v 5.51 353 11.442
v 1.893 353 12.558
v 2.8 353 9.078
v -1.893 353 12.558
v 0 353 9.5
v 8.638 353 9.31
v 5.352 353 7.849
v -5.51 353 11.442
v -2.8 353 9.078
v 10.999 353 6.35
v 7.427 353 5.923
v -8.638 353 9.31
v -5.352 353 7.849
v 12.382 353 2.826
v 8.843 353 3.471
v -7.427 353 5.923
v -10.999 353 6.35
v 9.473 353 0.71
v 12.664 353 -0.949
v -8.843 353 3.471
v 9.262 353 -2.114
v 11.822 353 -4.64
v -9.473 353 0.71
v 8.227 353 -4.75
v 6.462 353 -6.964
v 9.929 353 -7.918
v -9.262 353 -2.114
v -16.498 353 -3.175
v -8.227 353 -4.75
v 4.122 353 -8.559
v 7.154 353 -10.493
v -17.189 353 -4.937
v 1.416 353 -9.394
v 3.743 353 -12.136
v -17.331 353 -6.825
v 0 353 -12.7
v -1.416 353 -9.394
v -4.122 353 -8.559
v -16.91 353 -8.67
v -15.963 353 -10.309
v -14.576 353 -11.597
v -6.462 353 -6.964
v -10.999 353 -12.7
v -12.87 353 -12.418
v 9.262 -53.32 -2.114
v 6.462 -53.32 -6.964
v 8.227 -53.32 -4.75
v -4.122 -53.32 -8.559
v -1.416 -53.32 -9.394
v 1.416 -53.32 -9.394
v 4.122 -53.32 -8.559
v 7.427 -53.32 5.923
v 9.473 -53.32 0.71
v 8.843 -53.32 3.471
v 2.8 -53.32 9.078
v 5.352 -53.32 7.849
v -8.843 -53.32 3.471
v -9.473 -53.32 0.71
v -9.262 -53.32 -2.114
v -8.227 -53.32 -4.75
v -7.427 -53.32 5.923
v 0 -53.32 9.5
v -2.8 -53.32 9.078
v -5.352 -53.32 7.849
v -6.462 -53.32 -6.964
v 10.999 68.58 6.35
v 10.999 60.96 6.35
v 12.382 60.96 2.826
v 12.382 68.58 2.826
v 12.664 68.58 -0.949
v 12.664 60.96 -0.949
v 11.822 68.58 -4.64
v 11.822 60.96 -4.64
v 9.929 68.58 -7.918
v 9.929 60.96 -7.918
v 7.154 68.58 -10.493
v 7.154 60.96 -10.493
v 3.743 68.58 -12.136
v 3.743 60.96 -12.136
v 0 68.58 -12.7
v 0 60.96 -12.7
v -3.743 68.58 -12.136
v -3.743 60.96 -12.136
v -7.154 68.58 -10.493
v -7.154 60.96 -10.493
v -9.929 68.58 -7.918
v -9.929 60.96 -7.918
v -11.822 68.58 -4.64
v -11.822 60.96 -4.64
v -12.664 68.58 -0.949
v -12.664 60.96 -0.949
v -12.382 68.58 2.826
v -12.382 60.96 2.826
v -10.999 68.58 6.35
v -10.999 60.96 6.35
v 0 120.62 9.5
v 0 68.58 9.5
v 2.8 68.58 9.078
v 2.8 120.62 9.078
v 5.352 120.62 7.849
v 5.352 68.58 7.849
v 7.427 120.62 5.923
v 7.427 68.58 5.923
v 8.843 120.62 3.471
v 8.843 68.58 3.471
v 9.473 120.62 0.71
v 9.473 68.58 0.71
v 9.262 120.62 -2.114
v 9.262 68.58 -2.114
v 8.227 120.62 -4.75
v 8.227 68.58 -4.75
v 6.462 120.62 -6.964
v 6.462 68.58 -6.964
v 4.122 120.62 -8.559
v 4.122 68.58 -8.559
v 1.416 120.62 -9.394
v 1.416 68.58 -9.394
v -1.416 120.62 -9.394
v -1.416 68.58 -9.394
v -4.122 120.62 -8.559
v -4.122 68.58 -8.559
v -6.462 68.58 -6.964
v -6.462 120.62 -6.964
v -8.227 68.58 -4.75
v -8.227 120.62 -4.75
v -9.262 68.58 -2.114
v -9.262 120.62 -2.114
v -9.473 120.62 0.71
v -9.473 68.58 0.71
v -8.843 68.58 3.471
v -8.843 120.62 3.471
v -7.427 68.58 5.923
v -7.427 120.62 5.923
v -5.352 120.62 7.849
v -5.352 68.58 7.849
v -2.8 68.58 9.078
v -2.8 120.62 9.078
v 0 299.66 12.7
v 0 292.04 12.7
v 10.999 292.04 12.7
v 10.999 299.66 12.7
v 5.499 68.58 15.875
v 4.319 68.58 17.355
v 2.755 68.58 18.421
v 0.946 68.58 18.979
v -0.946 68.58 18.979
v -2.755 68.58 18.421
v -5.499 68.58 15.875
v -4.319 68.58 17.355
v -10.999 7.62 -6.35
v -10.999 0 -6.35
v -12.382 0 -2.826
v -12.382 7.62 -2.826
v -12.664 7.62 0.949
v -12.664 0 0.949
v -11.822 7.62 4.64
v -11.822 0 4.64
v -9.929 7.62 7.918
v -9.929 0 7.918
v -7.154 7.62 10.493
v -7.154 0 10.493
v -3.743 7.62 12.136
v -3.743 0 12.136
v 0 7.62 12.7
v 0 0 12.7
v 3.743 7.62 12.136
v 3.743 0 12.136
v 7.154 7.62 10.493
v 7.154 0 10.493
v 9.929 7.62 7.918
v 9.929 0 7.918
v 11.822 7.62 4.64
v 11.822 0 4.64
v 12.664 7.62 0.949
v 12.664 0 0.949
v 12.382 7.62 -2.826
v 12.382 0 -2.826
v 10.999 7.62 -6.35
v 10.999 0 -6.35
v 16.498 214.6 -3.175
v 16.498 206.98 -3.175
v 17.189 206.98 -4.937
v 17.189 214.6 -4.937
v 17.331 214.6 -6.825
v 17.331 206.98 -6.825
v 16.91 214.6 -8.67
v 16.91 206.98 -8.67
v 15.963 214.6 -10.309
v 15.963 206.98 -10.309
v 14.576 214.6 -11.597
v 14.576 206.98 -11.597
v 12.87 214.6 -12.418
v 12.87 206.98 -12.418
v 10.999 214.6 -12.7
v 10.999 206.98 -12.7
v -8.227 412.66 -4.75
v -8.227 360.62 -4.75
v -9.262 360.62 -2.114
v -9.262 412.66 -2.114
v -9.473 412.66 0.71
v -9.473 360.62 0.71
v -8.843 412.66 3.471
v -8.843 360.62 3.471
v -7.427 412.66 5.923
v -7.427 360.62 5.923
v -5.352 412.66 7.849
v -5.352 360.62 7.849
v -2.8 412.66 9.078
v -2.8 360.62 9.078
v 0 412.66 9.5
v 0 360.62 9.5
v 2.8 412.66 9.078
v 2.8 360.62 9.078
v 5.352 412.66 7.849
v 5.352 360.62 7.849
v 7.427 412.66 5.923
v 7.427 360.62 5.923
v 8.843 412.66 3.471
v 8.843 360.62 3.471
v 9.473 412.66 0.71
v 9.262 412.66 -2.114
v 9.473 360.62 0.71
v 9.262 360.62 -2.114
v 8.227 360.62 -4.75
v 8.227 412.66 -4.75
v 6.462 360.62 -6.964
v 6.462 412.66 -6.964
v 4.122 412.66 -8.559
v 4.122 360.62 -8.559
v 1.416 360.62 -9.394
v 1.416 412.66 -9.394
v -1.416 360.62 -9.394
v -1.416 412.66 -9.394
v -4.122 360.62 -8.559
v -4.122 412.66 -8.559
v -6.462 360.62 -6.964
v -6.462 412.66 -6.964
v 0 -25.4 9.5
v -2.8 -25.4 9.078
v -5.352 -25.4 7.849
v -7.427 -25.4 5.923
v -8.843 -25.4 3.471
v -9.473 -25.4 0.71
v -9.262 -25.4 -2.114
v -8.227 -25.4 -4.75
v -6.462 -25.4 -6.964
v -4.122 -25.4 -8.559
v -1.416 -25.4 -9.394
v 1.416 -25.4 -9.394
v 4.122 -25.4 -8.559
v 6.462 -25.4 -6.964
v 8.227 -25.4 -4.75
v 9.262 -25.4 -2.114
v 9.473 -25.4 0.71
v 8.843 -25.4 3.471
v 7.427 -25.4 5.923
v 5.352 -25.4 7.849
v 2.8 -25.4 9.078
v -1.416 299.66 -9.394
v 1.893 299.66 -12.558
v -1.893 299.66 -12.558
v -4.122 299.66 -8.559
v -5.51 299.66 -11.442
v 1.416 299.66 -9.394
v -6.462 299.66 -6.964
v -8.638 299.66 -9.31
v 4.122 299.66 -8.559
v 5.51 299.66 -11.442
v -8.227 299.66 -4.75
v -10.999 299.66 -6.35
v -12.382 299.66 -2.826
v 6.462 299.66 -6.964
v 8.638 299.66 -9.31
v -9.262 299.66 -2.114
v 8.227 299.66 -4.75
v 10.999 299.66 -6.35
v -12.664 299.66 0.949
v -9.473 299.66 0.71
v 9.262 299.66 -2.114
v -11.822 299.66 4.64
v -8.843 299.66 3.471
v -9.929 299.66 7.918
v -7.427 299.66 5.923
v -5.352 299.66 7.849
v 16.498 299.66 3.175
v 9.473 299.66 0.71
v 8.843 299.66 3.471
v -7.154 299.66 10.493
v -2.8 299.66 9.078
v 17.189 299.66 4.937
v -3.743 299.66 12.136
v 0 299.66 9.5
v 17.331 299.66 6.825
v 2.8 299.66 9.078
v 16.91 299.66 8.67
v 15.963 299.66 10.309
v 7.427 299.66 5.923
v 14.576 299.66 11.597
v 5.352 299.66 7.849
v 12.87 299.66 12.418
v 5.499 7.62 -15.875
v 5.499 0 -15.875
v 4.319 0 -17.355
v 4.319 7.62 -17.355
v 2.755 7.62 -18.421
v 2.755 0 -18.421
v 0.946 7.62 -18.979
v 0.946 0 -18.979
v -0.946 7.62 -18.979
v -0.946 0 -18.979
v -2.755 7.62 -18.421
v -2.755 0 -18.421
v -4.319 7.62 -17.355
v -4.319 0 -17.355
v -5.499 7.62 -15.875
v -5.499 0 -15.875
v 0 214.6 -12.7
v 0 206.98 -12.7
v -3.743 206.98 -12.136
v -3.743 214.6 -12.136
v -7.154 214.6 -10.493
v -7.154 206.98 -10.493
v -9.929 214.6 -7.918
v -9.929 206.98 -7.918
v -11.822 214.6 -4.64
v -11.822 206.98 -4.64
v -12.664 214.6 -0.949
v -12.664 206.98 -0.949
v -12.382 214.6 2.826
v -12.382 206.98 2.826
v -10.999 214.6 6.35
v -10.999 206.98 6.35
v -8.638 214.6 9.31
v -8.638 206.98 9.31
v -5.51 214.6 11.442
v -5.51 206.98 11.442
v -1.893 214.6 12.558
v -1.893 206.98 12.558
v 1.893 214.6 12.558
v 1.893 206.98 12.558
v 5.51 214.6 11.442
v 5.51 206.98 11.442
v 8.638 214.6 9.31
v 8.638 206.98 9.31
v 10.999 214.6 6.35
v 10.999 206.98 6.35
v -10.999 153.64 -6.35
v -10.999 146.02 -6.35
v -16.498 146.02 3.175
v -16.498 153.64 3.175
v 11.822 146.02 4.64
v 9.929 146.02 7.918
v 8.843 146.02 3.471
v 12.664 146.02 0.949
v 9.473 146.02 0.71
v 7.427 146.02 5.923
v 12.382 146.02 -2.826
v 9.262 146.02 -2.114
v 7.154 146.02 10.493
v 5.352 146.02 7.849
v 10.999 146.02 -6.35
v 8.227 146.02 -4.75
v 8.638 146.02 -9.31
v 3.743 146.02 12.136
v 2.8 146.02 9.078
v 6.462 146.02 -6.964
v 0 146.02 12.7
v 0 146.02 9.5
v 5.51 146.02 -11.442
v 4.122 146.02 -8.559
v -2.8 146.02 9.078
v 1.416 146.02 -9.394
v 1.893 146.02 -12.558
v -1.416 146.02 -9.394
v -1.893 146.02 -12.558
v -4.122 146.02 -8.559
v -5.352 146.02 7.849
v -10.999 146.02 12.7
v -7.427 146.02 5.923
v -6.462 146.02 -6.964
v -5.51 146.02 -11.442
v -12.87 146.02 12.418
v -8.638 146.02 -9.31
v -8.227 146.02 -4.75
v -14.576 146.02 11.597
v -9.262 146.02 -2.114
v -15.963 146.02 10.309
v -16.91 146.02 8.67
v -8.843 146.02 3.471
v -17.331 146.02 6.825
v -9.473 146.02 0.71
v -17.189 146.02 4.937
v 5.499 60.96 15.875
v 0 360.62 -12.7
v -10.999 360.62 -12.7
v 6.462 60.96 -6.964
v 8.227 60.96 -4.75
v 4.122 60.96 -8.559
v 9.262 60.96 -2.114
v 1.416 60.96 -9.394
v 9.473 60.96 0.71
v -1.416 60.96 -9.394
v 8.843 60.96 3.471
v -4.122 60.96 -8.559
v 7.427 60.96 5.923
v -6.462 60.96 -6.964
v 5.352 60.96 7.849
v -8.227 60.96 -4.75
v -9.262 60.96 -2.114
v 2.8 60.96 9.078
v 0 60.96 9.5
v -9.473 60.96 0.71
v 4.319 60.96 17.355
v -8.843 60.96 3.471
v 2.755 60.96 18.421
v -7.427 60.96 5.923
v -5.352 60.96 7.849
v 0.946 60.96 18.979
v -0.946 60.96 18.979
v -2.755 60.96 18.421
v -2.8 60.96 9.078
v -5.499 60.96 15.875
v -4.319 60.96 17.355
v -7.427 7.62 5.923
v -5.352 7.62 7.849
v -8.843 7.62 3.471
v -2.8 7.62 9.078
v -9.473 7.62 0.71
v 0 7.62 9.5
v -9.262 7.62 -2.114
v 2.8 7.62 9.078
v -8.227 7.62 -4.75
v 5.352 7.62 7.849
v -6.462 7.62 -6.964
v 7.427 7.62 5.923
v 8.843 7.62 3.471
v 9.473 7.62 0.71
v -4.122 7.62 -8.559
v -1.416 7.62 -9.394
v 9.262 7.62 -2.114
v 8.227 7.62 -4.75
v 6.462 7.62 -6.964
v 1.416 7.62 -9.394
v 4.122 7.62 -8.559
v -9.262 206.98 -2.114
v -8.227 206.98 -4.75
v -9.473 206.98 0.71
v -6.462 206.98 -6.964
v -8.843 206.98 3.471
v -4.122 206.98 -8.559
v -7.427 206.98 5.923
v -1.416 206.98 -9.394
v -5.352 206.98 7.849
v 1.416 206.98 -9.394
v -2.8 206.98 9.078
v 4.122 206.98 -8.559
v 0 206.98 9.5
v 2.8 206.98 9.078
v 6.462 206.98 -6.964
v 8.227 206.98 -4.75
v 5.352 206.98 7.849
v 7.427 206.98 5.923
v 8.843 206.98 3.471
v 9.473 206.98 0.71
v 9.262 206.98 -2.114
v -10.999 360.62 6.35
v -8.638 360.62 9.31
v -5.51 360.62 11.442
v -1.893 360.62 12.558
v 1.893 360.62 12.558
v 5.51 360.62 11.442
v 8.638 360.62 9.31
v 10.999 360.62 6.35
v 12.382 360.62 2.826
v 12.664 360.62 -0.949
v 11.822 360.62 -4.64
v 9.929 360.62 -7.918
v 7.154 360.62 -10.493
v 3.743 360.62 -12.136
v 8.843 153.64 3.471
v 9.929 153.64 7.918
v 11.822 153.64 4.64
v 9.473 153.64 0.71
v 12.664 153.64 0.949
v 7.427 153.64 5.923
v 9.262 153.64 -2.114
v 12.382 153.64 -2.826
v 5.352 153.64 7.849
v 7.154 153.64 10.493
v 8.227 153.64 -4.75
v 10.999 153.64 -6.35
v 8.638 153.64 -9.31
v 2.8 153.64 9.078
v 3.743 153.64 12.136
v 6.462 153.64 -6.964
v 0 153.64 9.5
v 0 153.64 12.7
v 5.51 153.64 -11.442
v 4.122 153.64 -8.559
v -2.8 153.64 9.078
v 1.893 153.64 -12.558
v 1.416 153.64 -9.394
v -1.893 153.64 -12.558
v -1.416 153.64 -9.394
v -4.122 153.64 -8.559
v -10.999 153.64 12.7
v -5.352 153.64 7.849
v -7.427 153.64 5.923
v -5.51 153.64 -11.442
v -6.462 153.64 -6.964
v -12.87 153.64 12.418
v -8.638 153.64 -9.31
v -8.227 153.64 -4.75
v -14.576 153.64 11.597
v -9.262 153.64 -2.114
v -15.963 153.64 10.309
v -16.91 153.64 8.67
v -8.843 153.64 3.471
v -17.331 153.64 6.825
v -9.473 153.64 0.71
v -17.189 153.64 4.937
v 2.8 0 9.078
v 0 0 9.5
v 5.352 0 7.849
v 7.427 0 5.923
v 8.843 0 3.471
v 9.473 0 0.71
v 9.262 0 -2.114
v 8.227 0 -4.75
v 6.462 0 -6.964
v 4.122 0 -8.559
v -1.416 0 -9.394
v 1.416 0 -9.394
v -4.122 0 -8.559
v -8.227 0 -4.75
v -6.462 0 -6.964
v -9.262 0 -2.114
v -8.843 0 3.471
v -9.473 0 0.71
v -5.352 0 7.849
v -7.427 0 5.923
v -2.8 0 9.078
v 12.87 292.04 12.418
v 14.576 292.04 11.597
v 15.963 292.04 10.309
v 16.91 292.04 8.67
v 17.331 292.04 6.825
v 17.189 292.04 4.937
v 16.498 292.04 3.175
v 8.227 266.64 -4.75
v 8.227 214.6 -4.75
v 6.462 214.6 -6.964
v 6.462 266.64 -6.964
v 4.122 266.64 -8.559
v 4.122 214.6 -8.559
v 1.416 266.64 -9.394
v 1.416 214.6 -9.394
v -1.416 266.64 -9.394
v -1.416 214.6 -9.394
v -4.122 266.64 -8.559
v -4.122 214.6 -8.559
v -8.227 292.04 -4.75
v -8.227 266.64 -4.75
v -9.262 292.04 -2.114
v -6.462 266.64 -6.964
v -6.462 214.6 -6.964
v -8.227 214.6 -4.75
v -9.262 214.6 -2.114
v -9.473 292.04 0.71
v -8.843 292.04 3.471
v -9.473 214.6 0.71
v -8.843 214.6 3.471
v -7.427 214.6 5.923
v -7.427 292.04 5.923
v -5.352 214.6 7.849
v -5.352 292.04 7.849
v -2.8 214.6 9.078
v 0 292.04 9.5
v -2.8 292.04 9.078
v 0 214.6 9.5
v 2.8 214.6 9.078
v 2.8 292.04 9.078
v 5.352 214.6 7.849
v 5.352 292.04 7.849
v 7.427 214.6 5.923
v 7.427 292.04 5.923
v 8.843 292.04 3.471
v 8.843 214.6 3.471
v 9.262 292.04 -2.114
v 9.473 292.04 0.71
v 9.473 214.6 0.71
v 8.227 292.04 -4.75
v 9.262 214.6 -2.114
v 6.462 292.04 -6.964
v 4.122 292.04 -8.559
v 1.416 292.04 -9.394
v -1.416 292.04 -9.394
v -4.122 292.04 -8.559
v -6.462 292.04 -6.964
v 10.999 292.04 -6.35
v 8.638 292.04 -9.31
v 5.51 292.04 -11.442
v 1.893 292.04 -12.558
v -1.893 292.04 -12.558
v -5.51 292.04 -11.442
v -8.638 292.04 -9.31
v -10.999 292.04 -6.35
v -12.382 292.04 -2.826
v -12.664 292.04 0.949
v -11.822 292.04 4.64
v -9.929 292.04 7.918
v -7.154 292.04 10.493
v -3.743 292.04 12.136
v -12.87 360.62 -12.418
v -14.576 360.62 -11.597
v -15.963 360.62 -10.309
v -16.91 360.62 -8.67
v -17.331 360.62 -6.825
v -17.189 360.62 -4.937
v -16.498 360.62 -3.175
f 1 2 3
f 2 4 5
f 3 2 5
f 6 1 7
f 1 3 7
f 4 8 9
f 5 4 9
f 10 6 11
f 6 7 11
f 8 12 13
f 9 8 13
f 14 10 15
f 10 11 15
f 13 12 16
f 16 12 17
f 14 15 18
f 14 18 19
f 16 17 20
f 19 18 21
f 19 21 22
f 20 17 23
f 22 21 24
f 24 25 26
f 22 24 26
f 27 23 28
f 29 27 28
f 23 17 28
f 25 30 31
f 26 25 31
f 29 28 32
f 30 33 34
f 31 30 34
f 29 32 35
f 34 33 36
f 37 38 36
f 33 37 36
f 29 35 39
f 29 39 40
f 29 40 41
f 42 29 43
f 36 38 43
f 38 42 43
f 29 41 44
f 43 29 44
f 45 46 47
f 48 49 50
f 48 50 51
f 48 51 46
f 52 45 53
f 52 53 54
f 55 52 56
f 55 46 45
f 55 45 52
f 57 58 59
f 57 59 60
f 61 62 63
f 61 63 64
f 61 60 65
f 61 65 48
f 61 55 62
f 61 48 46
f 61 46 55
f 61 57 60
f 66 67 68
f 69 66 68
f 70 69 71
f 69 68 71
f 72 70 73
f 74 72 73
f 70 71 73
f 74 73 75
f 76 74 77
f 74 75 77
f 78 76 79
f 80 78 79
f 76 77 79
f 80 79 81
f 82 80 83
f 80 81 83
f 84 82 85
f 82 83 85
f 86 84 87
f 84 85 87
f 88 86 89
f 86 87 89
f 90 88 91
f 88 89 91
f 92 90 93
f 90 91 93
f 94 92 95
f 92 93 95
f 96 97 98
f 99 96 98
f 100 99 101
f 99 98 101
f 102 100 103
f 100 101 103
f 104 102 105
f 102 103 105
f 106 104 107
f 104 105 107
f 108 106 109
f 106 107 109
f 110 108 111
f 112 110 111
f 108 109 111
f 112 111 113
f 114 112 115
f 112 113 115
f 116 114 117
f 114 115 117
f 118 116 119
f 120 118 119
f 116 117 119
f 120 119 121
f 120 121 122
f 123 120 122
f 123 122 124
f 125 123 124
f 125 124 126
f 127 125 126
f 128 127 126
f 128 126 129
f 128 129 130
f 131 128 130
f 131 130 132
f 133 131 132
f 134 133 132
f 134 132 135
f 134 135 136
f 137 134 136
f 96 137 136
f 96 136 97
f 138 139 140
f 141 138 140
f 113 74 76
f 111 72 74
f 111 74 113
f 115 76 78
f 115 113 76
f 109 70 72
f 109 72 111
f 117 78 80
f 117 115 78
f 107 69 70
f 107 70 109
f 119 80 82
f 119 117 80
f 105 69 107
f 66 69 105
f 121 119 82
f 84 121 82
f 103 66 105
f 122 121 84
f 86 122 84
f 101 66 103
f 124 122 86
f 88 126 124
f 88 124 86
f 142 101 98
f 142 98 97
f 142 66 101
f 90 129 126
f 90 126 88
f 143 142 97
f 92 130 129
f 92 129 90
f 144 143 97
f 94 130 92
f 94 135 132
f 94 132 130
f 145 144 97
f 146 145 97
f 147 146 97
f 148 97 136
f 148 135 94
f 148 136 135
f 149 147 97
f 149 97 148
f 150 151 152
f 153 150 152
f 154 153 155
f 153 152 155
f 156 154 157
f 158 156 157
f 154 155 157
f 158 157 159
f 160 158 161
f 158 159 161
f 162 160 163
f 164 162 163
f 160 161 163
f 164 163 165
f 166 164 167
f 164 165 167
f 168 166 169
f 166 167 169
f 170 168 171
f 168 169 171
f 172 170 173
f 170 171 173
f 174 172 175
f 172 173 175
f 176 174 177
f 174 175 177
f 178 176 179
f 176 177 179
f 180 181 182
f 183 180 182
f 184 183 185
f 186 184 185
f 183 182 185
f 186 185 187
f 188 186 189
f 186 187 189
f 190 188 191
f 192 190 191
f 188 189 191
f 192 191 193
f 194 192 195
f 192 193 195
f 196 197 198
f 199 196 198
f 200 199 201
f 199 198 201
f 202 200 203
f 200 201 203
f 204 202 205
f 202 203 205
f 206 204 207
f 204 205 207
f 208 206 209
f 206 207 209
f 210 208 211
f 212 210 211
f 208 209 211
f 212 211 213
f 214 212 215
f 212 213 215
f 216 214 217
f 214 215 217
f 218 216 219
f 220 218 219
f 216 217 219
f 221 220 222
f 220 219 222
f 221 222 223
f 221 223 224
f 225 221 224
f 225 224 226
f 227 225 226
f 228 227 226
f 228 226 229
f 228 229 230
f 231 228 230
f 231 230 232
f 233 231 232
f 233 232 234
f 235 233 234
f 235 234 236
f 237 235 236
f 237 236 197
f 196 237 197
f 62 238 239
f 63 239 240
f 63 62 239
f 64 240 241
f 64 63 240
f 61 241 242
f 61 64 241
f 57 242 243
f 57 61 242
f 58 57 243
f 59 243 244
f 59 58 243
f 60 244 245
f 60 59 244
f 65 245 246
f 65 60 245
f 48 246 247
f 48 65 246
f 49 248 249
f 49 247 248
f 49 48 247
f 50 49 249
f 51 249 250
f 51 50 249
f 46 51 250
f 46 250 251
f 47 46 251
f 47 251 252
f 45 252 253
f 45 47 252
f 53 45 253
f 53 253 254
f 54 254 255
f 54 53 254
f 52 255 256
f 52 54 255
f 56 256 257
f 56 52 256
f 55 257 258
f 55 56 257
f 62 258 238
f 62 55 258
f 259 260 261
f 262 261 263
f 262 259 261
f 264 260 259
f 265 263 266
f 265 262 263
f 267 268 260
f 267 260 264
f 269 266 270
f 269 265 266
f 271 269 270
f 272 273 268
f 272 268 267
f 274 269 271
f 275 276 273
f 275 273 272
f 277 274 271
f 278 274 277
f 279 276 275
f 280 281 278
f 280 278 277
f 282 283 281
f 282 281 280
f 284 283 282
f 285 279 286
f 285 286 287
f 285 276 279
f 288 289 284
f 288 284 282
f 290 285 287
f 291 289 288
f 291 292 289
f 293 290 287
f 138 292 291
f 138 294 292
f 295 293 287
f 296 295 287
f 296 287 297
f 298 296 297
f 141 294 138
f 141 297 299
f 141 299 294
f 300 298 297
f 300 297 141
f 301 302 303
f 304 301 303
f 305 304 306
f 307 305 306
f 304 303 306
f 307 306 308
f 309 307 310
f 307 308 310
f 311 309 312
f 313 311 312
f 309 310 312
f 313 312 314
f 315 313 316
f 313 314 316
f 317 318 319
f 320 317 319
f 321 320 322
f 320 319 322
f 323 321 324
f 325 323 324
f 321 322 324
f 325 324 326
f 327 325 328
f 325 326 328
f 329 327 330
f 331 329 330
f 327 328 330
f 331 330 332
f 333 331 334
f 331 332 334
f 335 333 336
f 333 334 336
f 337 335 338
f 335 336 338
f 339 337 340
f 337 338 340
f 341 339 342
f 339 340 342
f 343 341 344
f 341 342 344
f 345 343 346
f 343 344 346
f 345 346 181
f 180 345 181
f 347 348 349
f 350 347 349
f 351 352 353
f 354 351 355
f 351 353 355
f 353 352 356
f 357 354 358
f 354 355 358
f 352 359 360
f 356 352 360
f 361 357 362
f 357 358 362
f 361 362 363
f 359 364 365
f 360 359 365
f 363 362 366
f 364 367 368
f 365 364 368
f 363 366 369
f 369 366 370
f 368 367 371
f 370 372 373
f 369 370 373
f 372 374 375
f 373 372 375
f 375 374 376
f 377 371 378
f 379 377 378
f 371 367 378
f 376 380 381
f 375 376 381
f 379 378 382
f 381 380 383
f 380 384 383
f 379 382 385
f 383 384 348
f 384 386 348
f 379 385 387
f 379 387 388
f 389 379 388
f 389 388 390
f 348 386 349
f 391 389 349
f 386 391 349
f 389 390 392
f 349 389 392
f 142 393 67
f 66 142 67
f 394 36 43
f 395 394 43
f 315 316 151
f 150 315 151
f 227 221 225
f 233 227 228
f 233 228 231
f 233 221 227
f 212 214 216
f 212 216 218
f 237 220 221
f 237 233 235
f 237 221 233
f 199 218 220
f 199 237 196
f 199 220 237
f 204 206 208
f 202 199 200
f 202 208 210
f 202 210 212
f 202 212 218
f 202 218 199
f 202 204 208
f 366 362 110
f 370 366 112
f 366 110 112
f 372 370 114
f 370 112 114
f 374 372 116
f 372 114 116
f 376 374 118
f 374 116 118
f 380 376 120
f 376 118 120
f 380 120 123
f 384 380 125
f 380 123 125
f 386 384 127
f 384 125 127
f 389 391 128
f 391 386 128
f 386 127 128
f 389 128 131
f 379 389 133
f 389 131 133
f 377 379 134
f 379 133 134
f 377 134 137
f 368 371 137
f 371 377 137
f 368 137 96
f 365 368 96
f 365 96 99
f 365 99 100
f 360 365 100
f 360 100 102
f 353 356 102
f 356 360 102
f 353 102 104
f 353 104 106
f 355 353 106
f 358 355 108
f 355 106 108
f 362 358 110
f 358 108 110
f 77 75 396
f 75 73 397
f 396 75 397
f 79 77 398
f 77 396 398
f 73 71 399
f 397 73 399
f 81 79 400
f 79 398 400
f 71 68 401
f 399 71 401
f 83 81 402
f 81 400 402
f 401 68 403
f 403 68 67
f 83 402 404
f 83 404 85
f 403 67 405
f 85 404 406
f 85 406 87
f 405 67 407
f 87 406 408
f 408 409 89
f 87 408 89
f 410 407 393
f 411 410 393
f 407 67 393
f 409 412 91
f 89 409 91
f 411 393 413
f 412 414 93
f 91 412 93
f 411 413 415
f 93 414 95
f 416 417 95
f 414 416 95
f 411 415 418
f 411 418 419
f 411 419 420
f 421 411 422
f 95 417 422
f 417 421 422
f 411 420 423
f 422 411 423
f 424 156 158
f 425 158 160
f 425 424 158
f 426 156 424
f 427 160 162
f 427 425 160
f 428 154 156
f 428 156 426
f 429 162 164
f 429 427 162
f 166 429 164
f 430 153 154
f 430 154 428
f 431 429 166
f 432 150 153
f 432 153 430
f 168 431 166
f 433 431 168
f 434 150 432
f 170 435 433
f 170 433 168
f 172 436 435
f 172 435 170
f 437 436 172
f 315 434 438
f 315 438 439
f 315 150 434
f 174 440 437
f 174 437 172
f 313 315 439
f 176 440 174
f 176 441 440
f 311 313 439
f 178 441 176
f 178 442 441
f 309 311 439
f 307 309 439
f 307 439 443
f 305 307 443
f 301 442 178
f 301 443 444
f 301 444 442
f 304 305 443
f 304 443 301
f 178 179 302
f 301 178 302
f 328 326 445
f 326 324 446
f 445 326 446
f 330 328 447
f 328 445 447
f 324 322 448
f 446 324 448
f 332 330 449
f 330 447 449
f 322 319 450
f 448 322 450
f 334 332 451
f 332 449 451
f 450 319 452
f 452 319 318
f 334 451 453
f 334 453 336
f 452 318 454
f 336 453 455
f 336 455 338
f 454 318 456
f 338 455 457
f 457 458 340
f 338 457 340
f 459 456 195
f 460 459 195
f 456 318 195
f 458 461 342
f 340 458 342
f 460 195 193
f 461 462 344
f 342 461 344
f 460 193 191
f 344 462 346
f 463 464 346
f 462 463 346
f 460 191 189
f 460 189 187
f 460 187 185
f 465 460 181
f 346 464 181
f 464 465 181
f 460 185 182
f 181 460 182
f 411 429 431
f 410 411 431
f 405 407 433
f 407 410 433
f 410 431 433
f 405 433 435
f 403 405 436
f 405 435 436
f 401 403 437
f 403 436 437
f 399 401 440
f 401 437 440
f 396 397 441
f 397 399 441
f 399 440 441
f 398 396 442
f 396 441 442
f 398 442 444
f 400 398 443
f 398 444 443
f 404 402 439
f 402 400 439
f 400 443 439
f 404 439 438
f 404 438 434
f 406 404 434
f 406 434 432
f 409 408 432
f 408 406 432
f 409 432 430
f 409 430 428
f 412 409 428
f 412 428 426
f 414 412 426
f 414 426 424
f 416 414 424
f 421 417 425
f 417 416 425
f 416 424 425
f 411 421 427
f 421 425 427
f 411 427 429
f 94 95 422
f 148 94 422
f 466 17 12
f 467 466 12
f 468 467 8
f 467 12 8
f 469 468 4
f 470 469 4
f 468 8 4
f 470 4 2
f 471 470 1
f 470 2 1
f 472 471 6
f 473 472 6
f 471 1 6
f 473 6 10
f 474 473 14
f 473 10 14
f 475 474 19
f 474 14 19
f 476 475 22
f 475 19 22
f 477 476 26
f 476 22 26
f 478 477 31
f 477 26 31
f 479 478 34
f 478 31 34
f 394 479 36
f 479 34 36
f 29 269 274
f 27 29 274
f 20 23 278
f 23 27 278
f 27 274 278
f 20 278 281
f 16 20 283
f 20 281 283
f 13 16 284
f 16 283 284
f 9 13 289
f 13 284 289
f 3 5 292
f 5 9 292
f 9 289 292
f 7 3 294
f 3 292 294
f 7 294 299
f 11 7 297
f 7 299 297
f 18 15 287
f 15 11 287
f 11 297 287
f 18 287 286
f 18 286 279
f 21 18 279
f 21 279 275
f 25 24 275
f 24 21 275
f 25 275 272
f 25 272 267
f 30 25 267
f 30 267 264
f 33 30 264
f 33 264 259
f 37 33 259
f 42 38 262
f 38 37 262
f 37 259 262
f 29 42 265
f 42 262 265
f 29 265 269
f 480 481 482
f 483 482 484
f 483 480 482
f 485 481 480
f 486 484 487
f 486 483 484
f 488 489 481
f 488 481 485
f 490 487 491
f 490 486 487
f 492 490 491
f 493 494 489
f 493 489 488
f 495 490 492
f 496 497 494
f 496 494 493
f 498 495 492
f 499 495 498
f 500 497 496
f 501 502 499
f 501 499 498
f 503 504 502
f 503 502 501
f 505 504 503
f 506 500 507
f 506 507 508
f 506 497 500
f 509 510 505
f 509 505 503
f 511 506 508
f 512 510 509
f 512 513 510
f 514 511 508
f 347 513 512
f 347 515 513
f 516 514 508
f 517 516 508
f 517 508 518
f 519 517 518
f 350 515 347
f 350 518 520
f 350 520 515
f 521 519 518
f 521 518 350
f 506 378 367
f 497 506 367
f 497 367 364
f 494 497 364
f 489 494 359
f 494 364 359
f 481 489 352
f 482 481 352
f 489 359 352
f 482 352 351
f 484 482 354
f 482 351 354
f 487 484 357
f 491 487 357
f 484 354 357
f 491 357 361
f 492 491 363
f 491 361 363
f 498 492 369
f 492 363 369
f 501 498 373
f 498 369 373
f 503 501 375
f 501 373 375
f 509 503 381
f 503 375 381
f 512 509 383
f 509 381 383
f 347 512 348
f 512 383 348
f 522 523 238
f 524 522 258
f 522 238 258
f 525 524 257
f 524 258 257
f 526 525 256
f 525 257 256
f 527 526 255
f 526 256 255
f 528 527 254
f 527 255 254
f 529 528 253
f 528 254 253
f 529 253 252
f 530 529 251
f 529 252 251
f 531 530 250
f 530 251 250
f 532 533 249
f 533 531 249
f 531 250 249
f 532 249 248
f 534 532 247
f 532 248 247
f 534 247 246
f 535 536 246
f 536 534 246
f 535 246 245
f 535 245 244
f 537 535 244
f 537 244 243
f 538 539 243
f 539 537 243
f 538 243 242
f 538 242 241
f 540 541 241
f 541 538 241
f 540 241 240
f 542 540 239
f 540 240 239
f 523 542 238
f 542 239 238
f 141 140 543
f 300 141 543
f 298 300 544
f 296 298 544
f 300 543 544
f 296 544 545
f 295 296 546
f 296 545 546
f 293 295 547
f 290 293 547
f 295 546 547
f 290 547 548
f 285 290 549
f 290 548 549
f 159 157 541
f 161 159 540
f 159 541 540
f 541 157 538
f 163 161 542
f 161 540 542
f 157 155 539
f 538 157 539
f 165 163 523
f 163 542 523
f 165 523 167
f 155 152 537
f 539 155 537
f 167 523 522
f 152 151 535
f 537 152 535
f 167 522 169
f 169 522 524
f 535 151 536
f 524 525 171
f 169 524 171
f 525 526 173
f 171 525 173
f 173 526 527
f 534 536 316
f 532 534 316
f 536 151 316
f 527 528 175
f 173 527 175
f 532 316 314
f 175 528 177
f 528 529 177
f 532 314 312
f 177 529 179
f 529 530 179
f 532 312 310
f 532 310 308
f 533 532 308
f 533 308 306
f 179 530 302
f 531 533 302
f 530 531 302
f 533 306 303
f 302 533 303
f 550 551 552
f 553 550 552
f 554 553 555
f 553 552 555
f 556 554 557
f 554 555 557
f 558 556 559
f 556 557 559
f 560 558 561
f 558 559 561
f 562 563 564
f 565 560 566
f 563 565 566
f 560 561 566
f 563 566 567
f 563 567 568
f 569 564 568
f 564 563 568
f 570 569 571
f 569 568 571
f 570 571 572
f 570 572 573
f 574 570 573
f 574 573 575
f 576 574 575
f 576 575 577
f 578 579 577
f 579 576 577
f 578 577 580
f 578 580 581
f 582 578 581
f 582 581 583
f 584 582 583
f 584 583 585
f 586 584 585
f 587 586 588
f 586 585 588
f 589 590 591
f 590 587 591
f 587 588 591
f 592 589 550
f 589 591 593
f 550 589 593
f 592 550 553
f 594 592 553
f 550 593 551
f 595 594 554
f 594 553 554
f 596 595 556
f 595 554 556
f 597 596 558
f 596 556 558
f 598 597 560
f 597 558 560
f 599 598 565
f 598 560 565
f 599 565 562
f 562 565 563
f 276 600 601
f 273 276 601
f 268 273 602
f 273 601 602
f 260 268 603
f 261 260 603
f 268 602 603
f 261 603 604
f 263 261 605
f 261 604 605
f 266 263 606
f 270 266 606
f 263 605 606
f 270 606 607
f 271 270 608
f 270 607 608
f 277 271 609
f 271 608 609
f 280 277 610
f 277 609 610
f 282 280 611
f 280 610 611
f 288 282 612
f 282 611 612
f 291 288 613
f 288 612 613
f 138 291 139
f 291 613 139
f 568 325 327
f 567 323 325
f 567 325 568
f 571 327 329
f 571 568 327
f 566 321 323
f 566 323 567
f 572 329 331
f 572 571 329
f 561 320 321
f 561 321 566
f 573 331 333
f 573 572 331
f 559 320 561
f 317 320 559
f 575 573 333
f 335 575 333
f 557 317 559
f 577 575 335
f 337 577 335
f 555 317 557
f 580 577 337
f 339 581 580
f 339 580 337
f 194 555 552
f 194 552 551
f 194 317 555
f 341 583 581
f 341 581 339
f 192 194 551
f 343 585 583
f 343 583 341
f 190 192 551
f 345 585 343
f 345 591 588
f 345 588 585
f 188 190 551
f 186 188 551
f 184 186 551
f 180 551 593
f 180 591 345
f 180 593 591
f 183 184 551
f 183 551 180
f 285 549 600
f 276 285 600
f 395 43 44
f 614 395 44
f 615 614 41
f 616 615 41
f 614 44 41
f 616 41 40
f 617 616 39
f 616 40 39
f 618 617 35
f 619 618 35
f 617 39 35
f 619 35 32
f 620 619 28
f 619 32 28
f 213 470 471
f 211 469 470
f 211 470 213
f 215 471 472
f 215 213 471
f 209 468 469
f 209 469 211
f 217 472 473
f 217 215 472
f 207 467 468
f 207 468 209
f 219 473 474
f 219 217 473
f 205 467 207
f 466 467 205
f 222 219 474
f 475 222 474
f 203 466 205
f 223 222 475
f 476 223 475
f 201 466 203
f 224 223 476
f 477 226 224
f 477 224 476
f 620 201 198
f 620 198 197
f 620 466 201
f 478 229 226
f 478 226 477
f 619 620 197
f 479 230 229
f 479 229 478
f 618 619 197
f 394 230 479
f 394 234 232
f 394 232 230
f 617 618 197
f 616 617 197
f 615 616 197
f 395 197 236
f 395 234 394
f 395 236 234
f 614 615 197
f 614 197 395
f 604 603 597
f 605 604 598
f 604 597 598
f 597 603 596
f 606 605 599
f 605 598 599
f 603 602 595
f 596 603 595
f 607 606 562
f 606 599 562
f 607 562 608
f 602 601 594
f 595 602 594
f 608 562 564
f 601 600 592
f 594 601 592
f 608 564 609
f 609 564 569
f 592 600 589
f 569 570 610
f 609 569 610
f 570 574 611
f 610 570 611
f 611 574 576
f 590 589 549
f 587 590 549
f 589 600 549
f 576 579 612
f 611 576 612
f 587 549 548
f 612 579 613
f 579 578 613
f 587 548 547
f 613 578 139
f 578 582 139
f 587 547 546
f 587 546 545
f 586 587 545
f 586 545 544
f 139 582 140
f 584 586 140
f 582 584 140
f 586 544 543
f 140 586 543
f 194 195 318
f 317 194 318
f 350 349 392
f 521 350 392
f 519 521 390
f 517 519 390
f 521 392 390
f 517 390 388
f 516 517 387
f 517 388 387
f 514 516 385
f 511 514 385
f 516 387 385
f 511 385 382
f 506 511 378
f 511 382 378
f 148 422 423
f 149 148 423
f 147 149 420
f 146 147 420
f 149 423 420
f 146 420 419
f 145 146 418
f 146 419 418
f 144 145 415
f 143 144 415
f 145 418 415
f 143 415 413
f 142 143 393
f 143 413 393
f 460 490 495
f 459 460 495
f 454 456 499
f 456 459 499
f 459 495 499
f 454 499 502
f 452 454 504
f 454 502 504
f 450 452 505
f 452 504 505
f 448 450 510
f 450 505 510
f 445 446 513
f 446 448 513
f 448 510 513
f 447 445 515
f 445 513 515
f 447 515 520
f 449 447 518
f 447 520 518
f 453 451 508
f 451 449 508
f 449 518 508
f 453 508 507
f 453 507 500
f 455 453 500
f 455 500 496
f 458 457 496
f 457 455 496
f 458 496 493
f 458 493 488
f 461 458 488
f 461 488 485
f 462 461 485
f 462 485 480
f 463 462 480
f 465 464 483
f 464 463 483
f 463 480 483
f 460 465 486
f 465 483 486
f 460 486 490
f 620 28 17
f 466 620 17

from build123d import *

# Parameters (mm, degrees)
BOSS_EXTRUDE4_DEPTH   = 7.62
BODY_MOVE_COPY4_ANGLE = 180
BOSS_EXTRUDE5_START   = -25.4
SKETCH2_R             = 9.5
BOSS_EXTRUDE5_DEPTH   = 146.02
LPATTERN1_COUNT       = 3
LPATTERN1_PITCH       = 146.02
BODY_MOVE_COPY5_ANGLE = 120
BODY_MOVE_COPY6_ANGLE = 120
BOSS_EXTRUDE6_START   = 27.92
SKETCH4_R             = 9.5
BOSS_EXTRUDE6_DEPTH   = 27.92


with BuildPart() as part:
    # Sketch1 → Boss-Extrude4 (new body)
    with BuildSketch(Plane(origin=(0, 0, 0), x_dir=(1, 0, 0), z_dir=(0, 1, 0))):
        with BuildLine():
            Line((-5.499261314, 15.875), (-10.998522628, 6.35))
            ThreePointArc((-10.998522628, 6.35), (0, -12.7), (10.998522628, 6.35))
            Line((10.998522628, 6.35), (5.499261314, 15.875))
            ThreePointArc((5.499261314, 15.875), (0, 19.05), (-5.499261314, 15.875))
        make_face()
    extrude(amount=BOSS_EXTRUDE4_DEPTH)


with BuildPart() as body_2:
    # Body-Move/Copy3: copy of part
    add(part.part.moved(Location((0, 60.96, 0))))


with BuildPart() as body_2_1:
    # Body-Move/Copy4: moved
    add(body_2.part.rotate(Axis((0, 0, 0), (0, 1, 0)), BODY_MOVE_COPY4_ANGLE))


with BuildPart() as part_1:
    add(part.part)

    add(body_2_1.part)  # Boss-Extrude5 merges body 2
    # Sketch2 → Boss-Extrude5 (add)
    with BuildSketch(Plane(origin=(0, 0, 0), x_dir=(1, 0, 0), z_dir=(0, 1, 0)).offset(BOSS_EXTRUDE5_START)):
        Circle(SKETCH2_R)
    extrude(amount=BOSS_EXTRUDE5_DEPTH)


with BuildPart() as lpattern1_1:
    # LPattern1: pattern copy
    add(part_1.part.moved(Location(Vector(0, 1, 0) * (1 * LPATTERN1_PITCH))))


with BuildPart() as lpattern1_2:
    # LPattern1: pattern copy
    add(part_1.part.moved(Location(Vector(0, 1, 0) * (2 * LPATTERN1_PITCH))))


with BuildPart() as lpattern1_1_1:
    # Body-Move/Copy5: moved
    add(lpattern1_1.part.rotate(Axis((0, 0, 0), (0, 1, 0)), BODY_MOVE_COPY5_ANGLE))


with BuildPart() as lpattern1_2_1:
    # Body-Move/Copy6: moved
    add(lpattern1_2.part.rotate(Axis((0, 0, 0), (0, -1, 0)), BODY_MOVE_COPY6_ANGLE))


with BuildPart() as part_2:
    add(part_1.part)

    # Sketch4 → Boss-Extrude6 (add)
    with BuildSketch(Plane.XZ.offset(25.4).offset(BOSS_EXTRUDE6_START)):
        Circle(SKETCH4_R)
    extrude(amount=-BOSS_EXTRUDE6_DEPTH)


with BuildPart() as lpattern1_2_2:
    add(lpattern1_2_1.part)

    # Combine1: union LPattern1_1, part
    add(lpattern1_1_1.part)
    add(part_2.part)


solid = lpattern1_2_2.part
